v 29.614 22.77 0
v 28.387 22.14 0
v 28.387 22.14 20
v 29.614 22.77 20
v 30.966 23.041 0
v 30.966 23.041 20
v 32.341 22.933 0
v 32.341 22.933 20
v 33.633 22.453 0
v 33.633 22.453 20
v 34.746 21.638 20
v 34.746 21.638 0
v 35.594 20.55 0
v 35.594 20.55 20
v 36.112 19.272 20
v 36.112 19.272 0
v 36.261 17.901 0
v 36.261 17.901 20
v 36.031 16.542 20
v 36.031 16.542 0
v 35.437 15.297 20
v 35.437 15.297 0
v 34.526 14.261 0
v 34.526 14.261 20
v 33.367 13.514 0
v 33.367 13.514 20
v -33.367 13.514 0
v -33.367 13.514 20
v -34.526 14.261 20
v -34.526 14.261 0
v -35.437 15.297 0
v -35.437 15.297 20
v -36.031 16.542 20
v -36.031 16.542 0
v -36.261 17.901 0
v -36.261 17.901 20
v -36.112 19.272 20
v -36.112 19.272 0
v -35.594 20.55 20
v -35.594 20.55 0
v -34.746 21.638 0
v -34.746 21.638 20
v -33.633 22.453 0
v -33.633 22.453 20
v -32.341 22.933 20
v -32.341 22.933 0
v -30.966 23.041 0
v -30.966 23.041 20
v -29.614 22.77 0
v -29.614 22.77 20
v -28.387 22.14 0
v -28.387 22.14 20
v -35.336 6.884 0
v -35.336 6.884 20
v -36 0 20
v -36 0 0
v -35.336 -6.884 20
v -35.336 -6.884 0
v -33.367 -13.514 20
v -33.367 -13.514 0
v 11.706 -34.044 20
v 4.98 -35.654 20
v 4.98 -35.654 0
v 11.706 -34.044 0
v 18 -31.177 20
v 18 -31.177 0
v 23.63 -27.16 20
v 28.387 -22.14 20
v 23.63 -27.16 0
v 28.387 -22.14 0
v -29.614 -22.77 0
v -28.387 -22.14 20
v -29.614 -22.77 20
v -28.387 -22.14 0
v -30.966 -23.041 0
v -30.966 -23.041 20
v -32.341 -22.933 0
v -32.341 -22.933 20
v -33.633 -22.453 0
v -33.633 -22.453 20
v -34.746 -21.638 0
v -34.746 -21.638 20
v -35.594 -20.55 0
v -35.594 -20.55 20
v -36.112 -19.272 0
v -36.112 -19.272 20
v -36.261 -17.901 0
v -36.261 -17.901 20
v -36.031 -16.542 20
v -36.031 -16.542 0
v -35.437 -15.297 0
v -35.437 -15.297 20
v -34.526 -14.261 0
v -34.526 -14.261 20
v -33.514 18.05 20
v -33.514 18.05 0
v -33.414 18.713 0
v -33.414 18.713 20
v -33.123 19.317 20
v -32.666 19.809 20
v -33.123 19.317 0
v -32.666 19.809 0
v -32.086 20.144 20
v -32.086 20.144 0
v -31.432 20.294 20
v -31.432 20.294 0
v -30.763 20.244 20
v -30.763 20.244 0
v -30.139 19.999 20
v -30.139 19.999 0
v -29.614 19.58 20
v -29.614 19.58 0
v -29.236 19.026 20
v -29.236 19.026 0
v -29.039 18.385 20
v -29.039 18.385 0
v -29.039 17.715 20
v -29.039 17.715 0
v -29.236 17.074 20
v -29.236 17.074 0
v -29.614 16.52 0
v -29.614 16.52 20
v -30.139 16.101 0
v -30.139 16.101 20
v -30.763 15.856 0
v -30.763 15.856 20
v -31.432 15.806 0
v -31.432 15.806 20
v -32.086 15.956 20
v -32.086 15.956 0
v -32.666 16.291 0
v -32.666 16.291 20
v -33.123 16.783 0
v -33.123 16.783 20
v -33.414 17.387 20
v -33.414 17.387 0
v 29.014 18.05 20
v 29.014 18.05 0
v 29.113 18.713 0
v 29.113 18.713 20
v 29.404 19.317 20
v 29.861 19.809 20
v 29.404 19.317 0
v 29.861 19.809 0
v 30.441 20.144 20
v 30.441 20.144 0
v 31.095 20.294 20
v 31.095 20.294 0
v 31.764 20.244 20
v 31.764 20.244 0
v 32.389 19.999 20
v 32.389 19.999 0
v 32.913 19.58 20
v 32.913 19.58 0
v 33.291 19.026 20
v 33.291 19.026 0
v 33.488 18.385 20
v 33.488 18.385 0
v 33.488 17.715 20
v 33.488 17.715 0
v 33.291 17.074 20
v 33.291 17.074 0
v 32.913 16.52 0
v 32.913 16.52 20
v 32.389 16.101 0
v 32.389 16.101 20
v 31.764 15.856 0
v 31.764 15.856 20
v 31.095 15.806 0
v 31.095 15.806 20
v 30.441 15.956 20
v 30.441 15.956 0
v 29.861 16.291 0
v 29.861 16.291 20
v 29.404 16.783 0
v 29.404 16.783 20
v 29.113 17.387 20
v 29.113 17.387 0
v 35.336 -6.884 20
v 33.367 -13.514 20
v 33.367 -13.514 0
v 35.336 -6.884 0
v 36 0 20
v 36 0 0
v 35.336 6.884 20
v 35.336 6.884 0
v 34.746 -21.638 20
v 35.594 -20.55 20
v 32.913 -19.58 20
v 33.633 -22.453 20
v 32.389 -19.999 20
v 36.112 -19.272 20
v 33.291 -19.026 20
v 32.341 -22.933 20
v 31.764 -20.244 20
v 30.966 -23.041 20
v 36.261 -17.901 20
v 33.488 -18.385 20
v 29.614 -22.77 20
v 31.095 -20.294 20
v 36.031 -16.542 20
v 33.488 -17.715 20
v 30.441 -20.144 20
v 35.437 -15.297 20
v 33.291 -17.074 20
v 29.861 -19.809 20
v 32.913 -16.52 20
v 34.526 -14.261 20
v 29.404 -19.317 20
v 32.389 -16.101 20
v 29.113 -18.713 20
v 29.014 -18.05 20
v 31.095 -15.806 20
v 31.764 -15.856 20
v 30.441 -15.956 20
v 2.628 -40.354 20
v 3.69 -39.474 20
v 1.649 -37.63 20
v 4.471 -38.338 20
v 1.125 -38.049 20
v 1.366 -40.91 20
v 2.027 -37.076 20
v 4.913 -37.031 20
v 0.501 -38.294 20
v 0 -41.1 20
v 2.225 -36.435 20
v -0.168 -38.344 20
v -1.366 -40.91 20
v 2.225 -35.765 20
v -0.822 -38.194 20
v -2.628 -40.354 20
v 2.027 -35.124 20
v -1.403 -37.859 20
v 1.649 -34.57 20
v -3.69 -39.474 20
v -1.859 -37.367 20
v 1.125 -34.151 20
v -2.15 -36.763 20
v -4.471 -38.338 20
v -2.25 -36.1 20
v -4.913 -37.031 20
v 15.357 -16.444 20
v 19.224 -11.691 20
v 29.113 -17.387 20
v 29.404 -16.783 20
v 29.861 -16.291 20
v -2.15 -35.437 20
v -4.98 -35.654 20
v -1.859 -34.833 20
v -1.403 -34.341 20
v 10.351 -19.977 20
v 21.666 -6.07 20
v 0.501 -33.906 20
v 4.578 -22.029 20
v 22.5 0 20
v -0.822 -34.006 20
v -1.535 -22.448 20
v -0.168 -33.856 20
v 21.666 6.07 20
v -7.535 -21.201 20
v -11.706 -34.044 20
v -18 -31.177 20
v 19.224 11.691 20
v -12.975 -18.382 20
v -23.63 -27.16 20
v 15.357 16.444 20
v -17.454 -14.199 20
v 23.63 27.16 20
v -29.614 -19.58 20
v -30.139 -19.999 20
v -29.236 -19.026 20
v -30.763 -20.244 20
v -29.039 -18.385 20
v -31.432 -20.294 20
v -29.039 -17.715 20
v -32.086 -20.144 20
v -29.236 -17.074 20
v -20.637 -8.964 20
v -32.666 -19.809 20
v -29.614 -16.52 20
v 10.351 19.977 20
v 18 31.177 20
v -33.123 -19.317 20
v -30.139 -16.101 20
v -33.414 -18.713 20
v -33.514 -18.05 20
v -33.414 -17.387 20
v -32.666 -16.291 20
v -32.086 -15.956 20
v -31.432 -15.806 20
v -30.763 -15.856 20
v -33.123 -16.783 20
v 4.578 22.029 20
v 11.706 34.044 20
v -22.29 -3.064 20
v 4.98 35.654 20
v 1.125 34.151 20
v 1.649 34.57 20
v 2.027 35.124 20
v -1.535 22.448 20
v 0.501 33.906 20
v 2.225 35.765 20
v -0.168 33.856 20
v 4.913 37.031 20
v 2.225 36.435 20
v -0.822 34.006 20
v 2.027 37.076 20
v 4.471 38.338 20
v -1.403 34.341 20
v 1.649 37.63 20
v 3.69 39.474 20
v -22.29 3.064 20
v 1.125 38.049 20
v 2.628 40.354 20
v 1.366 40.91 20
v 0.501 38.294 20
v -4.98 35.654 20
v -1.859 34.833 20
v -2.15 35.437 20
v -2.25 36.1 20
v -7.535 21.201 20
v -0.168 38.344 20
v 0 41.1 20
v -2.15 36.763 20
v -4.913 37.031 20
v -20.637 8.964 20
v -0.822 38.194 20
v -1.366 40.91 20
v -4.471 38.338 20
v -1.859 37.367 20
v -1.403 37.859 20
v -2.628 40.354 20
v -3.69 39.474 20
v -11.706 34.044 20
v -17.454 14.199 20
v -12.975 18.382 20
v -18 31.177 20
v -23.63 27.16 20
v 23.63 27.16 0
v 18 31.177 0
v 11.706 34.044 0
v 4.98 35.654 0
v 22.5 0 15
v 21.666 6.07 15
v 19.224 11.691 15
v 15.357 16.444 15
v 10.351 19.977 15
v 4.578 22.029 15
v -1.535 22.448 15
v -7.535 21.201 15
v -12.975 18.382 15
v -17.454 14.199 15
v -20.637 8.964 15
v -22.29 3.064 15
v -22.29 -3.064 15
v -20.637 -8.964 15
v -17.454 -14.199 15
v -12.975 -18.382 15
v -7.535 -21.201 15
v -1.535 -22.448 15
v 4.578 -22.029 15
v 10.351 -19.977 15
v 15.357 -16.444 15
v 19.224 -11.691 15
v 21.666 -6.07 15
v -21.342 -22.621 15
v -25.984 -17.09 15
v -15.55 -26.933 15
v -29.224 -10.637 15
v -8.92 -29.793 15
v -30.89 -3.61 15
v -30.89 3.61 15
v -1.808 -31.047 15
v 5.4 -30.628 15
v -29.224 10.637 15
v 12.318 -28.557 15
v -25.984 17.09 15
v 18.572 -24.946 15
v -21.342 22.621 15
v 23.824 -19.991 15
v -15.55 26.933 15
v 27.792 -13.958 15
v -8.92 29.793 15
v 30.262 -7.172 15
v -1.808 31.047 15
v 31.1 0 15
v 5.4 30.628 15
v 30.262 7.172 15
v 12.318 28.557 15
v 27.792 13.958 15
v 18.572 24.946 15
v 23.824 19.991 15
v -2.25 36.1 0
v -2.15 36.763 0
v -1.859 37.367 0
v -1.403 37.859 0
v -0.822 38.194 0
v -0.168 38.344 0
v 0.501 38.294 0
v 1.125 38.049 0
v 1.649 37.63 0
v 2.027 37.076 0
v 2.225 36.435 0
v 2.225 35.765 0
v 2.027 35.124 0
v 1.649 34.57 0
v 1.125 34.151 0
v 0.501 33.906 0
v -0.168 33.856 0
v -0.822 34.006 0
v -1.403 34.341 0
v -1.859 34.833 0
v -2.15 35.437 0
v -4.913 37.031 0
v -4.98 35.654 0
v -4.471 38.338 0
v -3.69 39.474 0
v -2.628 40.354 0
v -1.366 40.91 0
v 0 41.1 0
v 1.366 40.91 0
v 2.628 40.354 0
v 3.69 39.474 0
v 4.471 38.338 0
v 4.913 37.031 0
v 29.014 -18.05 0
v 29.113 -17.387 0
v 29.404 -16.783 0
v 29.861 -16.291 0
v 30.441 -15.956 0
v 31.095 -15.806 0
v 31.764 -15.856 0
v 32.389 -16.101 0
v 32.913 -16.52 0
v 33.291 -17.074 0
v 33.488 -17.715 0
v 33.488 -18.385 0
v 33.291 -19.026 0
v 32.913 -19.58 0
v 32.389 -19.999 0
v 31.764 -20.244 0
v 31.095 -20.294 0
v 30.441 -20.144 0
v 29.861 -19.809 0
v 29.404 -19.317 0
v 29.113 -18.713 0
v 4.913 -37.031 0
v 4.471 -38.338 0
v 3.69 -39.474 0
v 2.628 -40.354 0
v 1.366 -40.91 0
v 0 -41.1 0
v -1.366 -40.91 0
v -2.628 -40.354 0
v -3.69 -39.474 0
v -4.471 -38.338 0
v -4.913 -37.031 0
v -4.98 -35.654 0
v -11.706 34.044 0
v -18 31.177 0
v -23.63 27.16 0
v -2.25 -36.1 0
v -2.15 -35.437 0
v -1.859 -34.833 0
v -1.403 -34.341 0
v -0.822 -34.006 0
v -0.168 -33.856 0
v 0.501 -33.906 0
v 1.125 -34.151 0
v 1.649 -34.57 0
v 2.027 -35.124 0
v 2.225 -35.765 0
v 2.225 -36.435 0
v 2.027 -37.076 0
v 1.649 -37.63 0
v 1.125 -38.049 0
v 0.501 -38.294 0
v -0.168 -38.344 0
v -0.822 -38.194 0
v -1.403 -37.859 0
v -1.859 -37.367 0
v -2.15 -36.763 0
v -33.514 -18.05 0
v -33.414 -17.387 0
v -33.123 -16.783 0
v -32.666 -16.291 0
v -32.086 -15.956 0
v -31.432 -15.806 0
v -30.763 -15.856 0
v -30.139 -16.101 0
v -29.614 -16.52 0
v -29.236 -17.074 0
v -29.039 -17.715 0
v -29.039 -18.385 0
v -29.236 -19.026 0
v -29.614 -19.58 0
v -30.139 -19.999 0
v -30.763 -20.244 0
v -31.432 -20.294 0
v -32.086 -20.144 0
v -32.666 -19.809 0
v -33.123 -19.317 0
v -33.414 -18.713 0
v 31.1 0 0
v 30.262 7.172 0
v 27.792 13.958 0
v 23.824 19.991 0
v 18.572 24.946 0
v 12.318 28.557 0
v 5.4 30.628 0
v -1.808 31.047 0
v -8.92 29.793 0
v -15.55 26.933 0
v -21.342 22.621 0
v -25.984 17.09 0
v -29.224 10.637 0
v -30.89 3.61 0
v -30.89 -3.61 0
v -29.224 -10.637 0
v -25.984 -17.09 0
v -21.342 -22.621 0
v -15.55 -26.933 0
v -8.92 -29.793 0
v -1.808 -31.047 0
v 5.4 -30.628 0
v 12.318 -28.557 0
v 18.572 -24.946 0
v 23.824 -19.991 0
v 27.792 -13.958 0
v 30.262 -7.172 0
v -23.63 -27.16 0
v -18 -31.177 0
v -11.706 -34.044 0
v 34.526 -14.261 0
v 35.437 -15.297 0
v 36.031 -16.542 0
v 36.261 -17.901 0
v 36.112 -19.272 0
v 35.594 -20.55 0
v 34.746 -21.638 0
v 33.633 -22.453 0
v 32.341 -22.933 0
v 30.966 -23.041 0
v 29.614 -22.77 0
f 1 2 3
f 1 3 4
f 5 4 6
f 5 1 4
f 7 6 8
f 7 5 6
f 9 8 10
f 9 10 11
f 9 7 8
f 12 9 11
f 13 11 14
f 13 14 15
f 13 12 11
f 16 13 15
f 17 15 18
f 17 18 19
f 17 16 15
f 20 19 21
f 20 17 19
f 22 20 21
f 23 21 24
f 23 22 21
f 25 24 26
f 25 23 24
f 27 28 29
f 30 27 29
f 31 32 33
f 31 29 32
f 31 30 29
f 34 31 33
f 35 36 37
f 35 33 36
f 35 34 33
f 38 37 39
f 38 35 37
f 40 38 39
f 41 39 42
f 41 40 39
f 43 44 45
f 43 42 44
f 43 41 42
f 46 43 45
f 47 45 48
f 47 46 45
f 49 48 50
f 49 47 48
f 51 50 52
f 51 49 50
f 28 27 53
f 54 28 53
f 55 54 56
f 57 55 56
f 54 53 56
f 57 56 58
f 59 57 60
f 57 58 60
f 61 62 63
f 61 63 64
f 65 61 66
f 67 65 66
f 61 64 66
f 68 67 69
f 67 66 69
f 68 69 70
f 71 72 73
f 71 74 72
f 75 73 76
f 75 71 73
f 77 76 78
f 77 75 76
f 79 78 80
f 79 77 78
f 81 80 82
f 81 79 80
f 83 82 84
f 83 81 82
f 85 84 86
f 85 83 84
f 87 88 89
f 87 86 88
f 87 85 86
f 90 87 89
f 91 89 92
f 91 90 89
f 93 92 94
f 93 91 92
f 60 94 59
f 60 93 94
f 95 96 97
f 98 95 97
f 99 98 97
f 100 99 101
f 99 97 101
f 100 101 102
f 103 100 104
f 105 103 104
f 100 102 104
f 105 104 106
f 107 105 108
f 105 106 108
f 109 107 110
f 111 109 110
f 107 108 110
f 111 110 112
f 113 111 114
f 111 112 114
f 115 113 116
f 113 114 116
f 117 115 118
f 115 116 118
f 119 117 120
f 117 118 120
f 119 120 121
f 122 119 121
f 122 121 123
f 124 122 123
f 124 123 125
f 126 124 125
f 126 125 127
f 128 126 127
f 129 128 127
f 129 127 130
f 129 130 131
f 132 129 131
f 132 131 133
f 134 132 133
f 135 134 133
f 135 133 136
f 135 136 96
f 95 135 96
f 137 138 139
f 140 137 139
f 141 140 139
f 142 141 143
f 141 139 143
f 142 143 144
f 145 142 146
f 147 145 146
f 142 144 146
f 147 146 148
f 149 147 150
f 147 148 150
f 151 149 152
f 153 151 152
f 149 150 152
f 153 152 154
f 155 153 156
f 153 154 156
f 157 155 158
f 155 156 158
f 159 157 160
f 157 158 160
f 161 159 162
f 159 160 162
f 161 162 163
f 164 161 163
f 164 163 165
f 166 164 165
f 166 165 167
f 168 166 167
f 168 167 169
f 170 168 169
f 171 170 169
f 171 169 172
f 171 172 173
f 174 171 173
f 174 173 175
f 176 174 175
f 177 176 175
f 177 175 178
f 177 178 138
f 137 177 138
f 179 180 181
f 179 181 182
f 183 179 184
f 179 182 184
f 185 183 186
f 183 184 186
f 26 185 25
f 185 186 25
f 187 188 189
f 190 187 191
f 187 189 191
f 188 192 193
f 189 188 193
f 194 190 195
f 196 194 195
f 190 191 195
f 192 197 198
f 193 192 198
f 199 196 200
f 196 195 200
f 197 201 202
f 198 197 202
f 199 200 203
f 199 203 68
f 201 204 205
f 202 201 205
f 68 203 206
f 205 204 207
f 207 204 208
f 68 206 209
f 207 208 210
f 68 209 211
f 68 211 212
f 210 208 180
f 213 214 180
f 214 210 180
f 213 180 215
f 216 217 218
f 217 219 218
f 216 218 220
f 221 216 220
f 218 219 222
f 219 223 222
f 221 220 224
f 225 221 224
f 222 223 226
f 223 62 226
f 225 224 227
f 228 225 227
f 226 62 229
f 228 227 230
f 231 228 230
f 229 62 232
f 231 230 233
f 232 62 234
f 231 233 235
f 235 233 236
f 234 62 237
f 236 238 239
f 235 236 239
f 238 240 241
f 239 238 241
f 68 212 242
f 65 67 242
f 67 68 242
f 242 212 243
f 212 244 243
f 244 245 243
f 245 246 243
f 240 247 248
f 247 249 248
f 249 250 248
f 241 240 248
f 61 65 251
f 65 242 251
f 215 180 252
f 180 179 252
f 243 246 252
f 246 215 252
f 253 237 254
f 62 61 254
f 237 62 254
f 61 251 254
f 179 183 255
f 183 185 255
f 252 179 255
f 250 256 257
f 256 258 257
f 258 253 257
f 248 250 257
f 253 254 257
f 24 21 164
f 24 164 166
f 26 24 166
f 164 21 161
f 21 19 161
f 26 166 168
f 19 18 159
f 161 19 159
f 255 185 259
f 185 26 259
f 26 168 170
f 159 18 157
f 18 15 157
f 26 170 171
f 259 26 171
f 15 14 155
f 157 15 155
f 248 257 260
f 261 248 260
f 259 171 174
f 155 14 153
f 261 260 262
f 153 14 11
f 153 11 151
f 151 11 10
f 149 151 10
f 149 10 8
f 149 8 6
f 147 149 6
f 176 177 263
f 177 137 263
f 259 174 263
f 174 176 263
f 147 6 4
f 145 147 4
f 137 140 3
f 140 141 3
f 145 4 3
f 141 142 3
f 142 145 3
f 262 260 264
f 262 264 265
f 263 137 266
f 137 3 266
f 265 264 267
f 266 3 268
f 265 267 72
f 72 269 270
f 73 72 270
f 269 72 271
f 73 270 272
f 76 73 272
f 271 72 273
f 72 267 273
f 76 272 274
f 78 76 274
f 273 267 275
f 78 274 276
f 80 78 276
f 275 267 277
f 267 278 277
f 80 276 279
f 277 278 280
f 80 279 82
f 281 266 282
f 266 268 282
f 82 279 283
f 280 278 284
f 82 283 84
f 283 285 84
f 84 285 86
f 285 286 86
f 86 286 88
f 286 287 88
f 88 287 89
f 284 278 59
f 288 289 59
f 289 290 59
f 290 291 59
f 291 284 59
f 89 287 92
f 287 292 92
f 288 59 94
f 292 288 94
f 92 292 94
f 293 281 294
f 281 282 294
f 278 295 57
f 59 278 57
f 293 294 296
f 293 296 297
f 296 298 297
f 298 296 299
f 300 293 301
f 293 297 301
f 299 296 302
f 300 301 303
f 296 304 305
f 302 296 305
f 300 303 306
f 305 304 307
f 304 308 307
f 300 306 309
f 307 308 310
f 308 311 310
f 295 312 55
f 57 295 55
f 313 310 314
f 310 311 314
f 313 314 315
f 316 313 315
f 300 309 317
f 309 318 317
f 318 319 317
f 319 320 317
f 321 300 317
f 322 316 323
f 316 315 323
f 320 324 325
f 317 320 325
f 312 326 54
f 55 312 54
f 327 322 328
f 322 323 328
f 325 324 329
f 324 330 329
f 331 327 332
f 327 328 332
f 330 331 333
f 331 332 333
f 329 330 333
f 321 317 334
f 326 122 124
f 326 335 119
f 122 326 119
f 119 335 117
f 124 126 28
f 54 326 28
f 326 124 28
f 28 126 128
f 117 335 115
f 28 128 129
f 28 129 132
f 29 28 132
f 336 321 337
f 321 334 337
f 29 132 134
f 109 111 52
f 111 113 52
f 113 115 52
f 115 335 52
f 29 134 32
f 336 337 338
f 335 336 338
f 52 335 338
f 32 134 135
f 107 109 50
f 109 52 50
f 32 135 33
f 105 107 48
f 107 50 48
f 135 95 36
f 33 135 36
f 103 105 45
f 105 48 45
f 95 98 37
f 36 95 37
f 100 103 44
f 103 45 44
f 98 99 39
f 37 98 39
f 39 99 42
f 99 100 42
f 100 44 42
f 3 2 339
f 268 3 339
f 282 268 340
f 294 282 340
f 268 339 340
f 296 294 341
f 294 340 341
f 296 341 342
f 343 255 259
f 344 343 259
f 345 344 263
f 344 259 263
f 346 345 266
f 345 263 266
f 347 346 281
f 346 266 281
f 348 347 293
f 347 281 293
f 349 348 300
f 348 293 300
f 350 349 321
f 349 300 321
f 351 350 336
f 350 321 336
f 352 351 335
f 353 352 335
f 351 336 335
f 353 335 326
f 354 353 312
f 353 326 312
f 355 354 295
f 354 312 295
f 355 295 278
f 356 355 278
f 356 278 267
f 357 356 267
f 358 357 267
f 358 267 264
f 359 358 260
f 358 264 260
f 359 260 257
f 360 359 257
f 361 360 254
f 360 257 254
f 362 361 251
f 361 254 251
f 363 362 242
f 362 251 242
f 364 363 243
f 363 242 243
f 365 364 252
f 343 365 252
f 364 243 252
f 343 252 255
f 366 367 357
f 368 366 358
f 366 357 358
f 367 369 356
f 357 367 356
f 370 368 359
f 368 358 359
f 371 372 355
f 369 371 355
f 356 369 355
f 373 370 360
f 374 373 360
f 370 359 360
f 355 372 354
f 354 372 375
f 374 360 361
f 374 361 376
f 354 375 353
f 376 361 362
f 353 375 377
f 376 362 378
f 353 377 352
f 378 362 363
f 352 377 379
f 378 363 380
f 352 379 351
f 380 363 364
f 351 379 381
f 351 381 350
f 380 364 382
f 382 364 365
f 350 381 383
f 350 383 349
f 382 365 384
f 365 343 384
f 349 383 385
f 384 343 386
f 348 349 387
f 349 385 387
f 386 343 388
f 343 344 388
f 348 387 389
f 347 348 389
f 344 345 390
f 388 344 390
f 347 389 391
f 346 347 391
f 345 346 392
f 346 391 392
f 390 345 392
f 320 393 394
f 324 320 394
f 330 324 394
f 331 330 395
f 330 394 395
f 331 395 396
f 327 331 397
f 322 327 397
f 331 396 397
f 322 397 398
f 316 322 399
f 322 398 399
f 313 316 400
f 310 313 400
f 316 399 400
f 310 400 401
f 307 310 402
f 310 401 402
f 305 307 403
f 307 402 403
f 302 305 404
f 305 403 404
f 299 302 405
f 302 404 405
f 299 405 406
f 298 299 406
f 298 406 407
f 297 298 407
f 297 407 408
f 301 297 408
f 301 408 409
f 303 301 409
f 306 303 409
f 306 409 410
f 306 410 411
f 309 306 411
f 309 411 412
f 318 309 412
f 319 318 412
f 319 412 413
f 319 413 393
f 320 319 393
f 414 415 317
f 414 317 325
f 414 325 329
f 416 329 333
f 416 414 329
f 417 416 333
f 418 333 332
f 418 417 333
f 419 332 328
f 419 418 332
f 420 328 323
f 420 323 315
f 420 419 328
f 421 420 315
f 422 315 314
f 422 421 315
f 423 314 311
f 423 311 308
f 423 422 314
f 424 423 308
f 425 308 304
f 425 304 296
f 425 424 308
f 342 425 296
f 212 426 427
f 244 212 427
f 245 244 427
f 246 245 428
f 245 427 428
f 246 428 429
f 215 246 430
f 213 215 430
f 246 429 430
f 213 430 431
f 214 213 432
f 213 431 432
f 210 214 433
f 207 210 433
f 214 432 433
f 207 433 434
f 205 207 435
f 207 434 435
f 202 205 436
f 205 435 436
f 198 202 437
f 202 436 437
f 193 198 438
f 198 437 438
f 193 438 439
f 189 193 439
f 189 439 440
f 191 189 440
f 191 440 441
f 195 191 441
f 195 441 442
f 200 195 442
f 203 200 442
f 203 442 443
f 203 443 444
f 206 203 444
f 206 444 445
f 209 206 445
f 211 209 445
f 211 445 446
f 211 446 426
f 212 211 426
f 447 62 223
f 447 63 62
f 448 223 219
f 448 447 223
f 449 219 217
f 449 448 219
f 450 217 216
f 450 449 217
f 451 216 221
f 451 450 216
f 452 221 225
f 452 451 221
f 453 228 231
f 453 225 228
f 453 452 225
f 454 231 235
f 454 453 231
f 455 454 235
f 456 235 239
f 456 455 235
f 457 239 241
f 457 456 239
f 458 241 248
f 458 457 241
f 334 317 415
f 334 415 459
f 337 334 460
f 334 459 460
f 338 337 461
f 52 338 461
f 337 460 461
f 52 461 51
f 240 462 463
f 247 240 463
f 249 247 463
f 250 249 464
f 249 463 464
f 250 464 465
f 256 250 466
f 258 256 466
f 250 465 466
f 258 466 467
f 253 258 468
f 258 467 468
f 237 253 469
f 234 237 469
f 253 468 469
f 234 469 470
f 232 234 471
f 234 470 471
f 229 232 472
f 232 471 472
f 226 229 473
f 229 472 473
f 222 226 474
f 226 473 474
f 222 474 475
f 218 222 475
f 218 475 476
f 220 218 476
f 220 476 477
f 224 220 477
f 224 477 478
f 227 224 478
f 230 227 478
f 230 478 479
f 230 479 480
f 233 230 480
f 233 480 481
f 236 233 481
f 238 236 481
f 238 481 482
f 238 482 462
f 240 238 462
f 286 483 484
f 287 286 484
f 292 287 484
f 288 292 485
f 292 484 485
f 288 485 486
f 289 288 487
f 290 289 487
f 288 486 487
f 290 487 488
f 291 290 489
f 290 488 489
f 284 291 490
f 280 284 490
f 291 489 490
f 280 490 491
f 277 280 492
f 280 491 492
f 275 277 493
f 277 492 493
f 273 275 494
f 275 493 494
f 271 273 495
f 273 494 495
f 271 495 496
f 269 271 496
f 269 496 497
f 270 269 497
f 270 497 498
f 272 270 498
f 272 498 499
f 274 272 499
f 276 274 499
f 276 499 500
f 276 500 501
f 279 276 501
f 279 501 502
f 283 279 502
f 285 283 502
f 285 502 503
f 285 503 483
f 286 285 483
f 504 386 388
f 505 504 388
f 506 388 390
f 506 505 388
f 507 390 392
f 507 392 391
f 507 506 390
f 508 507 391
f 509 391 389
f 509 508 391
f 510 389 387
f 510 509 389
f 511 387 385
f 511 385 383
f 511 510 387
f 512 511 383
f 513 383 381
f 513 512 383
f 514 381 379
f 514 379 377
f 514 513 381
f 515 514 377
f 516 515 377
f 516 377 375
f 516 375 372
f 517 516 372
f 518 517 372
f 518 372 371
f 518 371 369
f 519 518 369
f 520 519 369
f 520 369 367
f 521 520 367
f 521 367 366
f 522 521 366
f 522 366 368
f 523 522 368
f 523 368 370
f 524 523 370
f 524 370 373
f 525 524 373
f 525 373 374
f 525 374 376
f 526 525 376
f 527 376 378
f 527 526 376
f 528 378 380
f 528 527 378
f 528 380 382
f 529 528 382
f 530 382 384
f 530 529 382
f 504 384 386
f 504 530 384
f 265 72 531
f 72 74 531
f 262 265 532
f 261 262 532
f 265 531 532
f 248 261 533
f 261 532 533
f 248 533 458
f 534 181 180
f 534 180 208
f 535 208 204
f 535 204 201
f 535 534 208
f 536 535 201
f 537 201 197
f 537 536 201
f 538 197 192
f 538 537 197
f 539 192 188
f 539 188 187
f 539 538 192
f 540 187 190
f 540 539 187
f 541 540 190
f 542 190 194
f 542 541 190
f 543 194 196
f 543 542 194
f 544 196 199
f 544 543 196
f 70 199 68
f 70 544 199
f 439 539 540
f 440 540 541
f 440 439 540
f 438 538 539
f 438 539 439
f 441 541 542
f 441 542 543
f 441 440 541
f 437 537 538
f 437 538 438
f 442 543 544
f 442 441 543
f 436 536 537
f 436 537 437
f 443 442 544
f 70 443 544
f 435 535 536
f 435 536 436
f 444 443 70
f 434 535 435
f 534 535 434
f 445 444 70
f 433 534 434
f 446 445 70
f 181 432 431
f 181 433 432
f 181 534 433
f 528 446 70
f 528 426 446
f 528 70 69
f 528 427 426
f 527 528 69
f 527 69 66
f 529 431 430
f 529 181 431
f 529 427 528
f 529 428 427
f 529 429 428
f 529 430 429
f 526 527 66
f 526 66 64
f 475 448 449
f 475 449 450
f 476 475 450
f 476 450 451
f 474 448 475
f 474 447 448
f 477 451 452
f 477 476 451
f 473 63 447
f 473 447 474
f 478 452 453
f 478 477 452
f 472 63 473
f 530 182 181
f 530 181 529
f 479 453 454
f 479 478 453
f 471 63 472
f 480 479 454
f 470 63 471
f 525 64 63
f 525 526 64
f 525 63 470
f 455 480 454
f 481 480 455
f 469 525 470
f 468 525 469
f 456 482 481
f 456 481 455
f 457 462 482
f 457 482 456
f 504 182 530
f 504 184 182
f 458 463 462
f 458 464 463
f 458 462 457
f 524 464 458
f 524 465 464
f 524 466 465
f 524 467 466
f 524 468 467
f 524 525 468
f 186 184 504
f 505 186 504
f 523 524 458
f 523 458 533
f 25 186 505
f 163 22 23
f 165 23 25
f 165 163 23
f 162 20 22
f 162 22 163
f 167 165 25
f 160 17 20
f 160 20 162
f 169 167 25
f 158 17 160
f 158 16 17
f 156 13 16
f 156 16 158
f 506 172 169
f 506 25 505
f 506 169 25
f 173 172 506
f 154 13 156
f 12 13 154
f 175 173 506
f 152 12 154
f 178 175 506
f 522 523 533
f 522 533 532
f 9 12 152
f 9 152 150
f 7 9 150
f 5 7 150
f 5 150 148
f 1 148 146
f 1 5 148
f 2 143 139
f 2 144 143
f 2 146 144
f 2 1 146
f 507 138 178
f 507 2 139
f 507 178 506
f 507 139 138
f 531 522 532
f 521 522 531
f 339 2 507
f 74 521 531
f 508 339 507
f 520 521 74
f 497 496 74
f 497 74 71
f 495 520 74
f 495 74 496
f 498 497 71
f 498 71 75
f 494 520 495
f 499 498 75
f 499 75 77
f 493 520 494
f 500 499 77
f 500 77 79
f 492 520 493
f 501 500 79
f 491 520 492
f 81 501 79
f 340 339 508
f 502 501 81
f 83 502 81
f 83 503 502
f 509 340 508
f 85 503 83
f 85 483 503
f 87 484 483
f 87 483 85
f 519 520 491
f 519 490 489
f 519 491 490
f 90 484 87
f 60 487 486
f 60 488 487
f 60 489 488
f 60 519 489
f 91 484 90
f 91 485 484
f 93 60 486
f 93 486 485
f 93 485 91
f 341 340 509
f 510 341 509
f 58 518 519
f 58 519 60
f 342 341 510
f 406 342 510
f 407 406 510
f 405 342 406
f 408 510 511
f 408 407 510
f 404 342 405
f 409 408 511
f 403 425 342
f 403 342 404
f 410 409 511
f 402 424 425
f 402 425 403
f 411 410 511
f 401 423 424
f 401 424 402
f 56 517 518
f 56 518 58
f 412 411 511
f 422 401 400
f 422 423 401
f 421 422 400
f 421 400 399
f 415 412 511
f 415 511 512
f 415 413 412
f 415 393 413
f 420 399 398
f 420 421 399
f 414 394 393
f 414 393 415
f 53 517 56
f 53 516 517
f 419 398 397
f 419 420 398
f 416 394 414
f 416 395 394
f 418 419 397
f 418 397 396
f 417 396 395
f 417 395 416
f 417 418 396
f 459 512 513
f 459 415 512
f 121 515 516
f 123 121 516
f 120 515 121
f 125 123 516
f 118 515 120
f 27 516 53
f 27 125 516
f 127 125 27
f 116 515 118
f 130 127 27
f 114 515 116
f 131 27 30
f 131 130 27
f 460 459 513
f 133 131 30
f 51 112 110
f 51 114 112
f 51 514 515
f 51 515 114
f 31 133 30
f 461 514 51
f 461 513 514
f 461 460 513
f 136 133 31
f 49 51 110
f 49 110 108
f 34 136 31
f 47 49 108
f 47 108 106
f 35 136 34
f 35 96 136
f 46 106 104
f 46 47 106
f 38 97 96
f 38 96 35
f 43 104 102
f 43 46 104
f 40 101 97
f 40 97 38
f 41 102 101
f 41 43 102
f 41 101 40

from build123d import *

# Parameters (mm, degrees)
SKETCH1_R           = 36
SKETCH1_R_2         = 31.1
BOSS_EXTRUDE1_DEPTH = 15
SKETCH2_R           = 36
BOSS_EXTRUDE2_DEPTH = 5
SKETCH3_R           = 22.5
CUT_EXTRUDE1_DEPTH  = 5
SKETCH4_R           = 5
BOSS_EXTRUDE3_DEPTH = 20
SKETCH7_R           = 2.25
CUT_EXTRUDE2_DEPTH  = 21


with BuildPart() as part:
    # Sketch1 → Boss-Extrude1 (new body)
    with BuildSketch(Plane.XY):
        Circle(SKETCH1_R)
        Circle(SKETCH1_R_2, mode=Mode.SUBTRACT)
    extrude(amount=BOSS_EXTRUDE1_DEPTH)

    # Sketch2 → Boss-Extrude2 (add)
    with BuildSketch(Plane.XY.offset(15)):
        Circle(SKETCH2_R)
    extrude(amount=BOSS_EXTRUDE2_DEPTH)

    # Sketch3 → Cut-Extrude1 (cut)
    with BuildSketch(Plane.XY.offset(20)):
        Circle(SKETCH3_R)
    extrude(amount=-CUT_EXTRUDE1_DEPTH, mode=Mode.SUBTRACT)

    # Sketch4 → Boss-Extrude3 (add)
    with BuildSketch(Plane(origin=(0, 0, 0), x_dir=(-1, 0, 0), z_dir=(0, 0, -1))):
        with Locations((0, 36.1)):
            Circle(SKETCH4_R)
        with Locations((31.263517077, 18.05)):
            Circle(SKETCH4_R)
        with Locations((31.263517077, -18.05)):
            Circle(SKETCH4_R)
        with Locations((0, -36.1)):
            Circle(SKETCH4_R)
        with Locations((-31.263517077, -18.05)):
            Circle(SKETCH4_R)
        with Locations((-31.263517077, 18.05)):
            Circle(SKETCH4_R)
    extrude(amount=-BOSS_EXTRUDE3_DEPTH)

    # Sketch7 → Cut-Extrude2 (cut, through all)
    with BuildSketch(Plane(origin=(0, 0, 0), x_dir=(-1, 0, 0), z_dir=(0, 0, -1))):
        with Locations((-31.263517077, 18.05)):
            Circle(SKETCH7_R)
        with Locations((0, 36.1)):
            Circle(SKETCH7_R)
        with Locations((31.263517077, 18.05)):
            Circle(SKETCH7_R)
        with Locations((31.263517077, -18.05)):
            Circle(SKETCH7_R)
        with Locations((0, -36.1)):
            Circle(SKETCH7_R)
        with Locations((-31.263517077, -18.05)):
            Circle(SKETCH7_R)
    extrude(amount=-CUT_EXTRUDE2_DEPTH, mode=Mode.SUBTRACT)


solid = part.part
